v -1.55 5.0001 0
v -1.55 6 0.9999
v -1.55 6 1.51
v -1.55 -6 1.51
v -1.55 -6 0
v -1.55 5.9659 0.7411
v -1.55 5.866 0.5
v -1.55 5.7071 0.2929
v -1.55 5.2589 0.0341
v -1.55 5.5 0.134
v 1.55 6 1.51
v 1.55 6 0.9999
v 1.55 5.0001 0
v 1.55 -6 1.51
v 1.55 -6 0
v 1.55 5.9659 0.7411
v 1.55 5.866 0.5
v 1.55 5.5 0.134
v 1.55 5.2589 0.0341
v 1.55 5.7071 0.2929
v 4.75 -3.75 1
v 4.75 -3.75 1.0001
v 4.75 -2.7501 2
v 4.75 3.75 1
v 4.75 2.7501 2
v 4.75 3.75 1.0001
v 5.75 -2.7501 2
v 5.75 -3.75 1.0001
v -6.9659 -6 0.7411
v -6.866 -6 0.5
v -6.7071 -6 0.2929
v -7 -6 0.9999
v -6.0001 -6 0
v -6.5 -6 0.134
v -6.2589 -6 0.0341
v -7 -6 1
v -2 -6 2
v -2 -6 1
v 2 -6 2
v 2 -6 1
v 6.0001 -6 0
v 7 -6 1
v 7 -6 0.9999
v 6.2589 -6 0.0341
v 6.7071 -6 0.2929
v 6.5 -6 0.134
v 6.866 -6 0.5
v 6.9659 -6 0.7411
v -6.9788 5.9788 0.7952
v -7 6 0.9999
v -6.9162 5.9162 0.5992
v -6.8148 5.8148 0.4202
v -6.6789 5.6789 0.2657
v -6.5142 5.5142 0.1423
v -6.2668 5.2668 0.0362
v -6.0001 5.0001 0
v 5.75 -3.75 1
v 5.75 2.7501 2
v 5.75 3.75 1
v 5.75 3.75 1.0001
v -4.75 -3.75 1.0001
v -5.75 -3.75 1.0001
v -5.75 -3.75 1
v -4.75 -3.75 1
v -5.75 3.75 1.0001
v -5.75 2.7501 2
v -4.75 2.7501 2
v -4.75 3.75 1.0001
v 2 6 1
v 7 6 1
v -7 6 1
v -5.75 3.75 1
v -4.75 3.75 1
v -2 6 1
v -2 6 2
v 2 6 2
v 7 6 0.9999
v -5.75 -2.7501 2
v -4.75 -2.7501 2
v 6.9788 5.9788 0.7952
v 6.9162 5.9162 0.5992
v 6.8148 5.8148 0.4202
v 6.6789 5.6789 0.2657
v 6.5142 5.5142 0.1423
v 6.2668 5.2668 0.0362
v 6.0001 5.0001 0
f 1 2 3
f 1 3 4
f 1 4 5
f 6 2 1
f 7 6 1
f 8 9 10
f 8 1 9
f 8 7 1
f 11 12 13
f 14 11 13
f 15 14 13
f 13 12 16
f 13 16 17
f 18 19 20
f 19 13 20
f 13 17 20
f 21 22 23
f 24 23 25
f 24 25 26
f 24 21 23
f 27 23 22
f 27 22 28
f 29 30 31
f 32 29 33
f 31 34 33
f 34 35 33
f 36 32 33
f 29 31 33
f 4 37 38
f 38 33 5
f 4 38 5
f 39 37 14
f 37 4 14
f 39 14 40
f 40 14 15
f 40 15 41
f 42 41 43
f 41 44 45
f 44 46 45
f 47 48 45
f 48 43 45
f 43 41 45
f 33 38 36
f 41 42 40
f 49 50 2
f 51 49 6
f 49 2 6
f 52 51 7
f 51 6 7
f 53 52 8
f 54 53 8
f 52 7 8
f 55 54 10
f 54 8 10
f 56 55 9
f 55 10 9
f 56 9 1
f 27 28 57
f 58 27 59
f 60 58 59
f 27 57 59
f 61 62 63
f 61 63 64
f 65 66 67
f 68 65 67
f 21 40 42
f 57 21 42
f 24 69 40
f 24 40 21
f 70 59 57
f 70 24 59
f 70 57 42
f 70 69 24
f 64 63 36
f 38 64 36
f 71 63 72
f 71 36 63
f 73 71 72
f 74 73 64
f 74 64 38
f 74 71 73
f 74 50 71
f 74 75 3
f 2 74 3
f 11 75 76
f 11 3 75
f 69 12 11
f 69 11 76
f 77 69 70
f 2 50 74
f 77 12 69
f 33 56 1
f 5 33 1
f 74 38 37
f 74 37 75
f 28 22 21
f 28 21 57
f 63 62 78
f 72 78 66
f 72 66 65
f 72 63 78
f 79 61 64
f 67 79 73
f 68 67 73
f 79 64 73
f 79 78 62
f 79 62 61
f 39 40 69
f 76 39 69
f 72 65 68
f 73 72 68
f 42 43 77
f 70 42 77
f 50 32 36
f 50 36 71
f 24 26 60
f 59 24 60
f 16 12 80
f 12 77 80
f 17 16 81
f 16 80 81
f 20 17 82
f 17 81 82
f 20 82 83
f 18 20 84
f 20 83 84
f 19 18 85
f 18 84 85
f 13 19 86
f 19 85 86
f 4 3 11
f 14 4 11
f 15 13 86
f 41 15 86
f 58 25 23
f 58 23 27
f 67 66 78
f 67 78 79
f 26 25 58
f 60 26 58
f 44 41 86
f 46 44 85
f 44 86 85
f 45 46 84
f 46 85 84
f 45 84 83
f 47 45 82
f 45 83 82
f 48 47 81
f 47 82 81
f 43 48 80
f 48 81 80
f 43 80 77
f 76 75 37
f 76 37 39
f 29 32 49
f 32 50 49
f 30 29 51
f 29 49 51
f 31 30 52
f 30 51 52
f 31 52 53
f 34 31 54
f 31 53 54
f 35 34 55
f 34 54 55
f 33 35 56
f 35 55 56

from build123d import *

# Parameters (mm, degrees)
SKETCH1_W           = 14
SKETCH1_H           = 12
BOSS_EXTRUDE1_DEPTH = 1
SKETCH2_W           = 4
SKETCH2_H           = 12
BOSS_EXTRUDE2_DEPTH = 1
SKETCH3_W           = 3.1
SKETCH3_H           = 1.51
CUT_EXTRUDE1_DEPTH  = 15.035668848
SKETCH6_W           = 1
SKETCH6_H           = 9.5
BOSS_EXTRUDE5_DEPTH = 1
FILLET2_R           = 1
SKETCH7_W           = 1
SKETCH7_H           = 1
CUT_EXTRUDE2_DEPTH  = 1
CHAMFER1_SIZE       = 1


with BuildPart() as part:
    # Sketch1 → Boss-Extrude1 (new body)
    with BuildSketch(Plane.XY):
        Rectangle(SKETCH1_W, SKETCH1_H)
    extrude(amount=BOSS_EXTRUDE1_DEPTH)

    # Sketch2 → Boss-Extrude2 (add)
    with BuildSketch(Plane.XY.offset(1)):
        Rectangle(SKETCH2_W, SKETCH2_H)
    extrude(amount=BOSS_EXTRUDE2_DEPTH)

    # Sketch3 → Cut-Extrude1 (cut, through all)
    with BuildSketch(Plane(origin=(0, 6, 0), x_dir=(1, 0, 0), z_dir=(0, 1, 0))):
        with Locations((0, -0.755)):
            Rectangle(SKETCH3_W, SKETCH3_H)
    extrude(amount=-CUT_EXTRUDE1_DEPTH, mode=Mode.SUBTRACT)

    # Sketch6 → Boss-Extrude5 (add)
    with BuildSketch(Plane.XY.offset(1)):
        with Locations((5.25, 0)):
            Rectangle(SKETCH6_W, SKETCH6_H)
        with Locations((-5.25, 0)):
            Rectangle(SKETCH6_W, SKETCH6_H)
    extrude(amount=BOSS_EXTRUDE5_DEPTH)

    # Fillet2
    fillet2_edges = [part.edges().sort_by_distance(p)[0] for p in [
        (-4.275, 6, 0),
        (4.275, 6, 0),
        (7, 0, 0),
        (-7, 0, 0),
    ]]
    fillet(fillet2_edges, radius=FILLET2_R - 0.0001)  # a hair under: the kernel refuses the full size

    # Sketch7 → Cut-Extrude2 (cut)
    with BuildSketch(Plane.XY.offset(2)):
        with Locations((-5.25, -4.25)):
            Rectangle(SKETCH7_W, SKETCH7_H)
        with Locations((5.25, -4.25)):
            Rectangle(SKETCH7_W, SKETCH7_H)
        with Locations((-5.25, 4.25)):
            Rectangle(SKETCH7_W, SKETCH7_H)
        with Locations((5.25, 4.25)):
            Rectangle(SKETCH7_W, SKETCH7_H)
    extrude(amount=-CUT_EXTRUDE2_DEPTH, mode=Mode.SUBTRACT)

    # Chamfer1
    chamfer1_edges = [part.edges().sort_by_distance(p)[0] for p in [
        (5.25, -3.75, 2),
        (-5.25, -3.75, 2),
        (5.25, 3.75, 2),
        (-5.25, 3.75, 2),
    ]]
    chamfer(chamfer1_edges, length=CHAMFER1_SIZE - 0.0001)  # a hair under: the kernel refuses the full size


solid = part.part
